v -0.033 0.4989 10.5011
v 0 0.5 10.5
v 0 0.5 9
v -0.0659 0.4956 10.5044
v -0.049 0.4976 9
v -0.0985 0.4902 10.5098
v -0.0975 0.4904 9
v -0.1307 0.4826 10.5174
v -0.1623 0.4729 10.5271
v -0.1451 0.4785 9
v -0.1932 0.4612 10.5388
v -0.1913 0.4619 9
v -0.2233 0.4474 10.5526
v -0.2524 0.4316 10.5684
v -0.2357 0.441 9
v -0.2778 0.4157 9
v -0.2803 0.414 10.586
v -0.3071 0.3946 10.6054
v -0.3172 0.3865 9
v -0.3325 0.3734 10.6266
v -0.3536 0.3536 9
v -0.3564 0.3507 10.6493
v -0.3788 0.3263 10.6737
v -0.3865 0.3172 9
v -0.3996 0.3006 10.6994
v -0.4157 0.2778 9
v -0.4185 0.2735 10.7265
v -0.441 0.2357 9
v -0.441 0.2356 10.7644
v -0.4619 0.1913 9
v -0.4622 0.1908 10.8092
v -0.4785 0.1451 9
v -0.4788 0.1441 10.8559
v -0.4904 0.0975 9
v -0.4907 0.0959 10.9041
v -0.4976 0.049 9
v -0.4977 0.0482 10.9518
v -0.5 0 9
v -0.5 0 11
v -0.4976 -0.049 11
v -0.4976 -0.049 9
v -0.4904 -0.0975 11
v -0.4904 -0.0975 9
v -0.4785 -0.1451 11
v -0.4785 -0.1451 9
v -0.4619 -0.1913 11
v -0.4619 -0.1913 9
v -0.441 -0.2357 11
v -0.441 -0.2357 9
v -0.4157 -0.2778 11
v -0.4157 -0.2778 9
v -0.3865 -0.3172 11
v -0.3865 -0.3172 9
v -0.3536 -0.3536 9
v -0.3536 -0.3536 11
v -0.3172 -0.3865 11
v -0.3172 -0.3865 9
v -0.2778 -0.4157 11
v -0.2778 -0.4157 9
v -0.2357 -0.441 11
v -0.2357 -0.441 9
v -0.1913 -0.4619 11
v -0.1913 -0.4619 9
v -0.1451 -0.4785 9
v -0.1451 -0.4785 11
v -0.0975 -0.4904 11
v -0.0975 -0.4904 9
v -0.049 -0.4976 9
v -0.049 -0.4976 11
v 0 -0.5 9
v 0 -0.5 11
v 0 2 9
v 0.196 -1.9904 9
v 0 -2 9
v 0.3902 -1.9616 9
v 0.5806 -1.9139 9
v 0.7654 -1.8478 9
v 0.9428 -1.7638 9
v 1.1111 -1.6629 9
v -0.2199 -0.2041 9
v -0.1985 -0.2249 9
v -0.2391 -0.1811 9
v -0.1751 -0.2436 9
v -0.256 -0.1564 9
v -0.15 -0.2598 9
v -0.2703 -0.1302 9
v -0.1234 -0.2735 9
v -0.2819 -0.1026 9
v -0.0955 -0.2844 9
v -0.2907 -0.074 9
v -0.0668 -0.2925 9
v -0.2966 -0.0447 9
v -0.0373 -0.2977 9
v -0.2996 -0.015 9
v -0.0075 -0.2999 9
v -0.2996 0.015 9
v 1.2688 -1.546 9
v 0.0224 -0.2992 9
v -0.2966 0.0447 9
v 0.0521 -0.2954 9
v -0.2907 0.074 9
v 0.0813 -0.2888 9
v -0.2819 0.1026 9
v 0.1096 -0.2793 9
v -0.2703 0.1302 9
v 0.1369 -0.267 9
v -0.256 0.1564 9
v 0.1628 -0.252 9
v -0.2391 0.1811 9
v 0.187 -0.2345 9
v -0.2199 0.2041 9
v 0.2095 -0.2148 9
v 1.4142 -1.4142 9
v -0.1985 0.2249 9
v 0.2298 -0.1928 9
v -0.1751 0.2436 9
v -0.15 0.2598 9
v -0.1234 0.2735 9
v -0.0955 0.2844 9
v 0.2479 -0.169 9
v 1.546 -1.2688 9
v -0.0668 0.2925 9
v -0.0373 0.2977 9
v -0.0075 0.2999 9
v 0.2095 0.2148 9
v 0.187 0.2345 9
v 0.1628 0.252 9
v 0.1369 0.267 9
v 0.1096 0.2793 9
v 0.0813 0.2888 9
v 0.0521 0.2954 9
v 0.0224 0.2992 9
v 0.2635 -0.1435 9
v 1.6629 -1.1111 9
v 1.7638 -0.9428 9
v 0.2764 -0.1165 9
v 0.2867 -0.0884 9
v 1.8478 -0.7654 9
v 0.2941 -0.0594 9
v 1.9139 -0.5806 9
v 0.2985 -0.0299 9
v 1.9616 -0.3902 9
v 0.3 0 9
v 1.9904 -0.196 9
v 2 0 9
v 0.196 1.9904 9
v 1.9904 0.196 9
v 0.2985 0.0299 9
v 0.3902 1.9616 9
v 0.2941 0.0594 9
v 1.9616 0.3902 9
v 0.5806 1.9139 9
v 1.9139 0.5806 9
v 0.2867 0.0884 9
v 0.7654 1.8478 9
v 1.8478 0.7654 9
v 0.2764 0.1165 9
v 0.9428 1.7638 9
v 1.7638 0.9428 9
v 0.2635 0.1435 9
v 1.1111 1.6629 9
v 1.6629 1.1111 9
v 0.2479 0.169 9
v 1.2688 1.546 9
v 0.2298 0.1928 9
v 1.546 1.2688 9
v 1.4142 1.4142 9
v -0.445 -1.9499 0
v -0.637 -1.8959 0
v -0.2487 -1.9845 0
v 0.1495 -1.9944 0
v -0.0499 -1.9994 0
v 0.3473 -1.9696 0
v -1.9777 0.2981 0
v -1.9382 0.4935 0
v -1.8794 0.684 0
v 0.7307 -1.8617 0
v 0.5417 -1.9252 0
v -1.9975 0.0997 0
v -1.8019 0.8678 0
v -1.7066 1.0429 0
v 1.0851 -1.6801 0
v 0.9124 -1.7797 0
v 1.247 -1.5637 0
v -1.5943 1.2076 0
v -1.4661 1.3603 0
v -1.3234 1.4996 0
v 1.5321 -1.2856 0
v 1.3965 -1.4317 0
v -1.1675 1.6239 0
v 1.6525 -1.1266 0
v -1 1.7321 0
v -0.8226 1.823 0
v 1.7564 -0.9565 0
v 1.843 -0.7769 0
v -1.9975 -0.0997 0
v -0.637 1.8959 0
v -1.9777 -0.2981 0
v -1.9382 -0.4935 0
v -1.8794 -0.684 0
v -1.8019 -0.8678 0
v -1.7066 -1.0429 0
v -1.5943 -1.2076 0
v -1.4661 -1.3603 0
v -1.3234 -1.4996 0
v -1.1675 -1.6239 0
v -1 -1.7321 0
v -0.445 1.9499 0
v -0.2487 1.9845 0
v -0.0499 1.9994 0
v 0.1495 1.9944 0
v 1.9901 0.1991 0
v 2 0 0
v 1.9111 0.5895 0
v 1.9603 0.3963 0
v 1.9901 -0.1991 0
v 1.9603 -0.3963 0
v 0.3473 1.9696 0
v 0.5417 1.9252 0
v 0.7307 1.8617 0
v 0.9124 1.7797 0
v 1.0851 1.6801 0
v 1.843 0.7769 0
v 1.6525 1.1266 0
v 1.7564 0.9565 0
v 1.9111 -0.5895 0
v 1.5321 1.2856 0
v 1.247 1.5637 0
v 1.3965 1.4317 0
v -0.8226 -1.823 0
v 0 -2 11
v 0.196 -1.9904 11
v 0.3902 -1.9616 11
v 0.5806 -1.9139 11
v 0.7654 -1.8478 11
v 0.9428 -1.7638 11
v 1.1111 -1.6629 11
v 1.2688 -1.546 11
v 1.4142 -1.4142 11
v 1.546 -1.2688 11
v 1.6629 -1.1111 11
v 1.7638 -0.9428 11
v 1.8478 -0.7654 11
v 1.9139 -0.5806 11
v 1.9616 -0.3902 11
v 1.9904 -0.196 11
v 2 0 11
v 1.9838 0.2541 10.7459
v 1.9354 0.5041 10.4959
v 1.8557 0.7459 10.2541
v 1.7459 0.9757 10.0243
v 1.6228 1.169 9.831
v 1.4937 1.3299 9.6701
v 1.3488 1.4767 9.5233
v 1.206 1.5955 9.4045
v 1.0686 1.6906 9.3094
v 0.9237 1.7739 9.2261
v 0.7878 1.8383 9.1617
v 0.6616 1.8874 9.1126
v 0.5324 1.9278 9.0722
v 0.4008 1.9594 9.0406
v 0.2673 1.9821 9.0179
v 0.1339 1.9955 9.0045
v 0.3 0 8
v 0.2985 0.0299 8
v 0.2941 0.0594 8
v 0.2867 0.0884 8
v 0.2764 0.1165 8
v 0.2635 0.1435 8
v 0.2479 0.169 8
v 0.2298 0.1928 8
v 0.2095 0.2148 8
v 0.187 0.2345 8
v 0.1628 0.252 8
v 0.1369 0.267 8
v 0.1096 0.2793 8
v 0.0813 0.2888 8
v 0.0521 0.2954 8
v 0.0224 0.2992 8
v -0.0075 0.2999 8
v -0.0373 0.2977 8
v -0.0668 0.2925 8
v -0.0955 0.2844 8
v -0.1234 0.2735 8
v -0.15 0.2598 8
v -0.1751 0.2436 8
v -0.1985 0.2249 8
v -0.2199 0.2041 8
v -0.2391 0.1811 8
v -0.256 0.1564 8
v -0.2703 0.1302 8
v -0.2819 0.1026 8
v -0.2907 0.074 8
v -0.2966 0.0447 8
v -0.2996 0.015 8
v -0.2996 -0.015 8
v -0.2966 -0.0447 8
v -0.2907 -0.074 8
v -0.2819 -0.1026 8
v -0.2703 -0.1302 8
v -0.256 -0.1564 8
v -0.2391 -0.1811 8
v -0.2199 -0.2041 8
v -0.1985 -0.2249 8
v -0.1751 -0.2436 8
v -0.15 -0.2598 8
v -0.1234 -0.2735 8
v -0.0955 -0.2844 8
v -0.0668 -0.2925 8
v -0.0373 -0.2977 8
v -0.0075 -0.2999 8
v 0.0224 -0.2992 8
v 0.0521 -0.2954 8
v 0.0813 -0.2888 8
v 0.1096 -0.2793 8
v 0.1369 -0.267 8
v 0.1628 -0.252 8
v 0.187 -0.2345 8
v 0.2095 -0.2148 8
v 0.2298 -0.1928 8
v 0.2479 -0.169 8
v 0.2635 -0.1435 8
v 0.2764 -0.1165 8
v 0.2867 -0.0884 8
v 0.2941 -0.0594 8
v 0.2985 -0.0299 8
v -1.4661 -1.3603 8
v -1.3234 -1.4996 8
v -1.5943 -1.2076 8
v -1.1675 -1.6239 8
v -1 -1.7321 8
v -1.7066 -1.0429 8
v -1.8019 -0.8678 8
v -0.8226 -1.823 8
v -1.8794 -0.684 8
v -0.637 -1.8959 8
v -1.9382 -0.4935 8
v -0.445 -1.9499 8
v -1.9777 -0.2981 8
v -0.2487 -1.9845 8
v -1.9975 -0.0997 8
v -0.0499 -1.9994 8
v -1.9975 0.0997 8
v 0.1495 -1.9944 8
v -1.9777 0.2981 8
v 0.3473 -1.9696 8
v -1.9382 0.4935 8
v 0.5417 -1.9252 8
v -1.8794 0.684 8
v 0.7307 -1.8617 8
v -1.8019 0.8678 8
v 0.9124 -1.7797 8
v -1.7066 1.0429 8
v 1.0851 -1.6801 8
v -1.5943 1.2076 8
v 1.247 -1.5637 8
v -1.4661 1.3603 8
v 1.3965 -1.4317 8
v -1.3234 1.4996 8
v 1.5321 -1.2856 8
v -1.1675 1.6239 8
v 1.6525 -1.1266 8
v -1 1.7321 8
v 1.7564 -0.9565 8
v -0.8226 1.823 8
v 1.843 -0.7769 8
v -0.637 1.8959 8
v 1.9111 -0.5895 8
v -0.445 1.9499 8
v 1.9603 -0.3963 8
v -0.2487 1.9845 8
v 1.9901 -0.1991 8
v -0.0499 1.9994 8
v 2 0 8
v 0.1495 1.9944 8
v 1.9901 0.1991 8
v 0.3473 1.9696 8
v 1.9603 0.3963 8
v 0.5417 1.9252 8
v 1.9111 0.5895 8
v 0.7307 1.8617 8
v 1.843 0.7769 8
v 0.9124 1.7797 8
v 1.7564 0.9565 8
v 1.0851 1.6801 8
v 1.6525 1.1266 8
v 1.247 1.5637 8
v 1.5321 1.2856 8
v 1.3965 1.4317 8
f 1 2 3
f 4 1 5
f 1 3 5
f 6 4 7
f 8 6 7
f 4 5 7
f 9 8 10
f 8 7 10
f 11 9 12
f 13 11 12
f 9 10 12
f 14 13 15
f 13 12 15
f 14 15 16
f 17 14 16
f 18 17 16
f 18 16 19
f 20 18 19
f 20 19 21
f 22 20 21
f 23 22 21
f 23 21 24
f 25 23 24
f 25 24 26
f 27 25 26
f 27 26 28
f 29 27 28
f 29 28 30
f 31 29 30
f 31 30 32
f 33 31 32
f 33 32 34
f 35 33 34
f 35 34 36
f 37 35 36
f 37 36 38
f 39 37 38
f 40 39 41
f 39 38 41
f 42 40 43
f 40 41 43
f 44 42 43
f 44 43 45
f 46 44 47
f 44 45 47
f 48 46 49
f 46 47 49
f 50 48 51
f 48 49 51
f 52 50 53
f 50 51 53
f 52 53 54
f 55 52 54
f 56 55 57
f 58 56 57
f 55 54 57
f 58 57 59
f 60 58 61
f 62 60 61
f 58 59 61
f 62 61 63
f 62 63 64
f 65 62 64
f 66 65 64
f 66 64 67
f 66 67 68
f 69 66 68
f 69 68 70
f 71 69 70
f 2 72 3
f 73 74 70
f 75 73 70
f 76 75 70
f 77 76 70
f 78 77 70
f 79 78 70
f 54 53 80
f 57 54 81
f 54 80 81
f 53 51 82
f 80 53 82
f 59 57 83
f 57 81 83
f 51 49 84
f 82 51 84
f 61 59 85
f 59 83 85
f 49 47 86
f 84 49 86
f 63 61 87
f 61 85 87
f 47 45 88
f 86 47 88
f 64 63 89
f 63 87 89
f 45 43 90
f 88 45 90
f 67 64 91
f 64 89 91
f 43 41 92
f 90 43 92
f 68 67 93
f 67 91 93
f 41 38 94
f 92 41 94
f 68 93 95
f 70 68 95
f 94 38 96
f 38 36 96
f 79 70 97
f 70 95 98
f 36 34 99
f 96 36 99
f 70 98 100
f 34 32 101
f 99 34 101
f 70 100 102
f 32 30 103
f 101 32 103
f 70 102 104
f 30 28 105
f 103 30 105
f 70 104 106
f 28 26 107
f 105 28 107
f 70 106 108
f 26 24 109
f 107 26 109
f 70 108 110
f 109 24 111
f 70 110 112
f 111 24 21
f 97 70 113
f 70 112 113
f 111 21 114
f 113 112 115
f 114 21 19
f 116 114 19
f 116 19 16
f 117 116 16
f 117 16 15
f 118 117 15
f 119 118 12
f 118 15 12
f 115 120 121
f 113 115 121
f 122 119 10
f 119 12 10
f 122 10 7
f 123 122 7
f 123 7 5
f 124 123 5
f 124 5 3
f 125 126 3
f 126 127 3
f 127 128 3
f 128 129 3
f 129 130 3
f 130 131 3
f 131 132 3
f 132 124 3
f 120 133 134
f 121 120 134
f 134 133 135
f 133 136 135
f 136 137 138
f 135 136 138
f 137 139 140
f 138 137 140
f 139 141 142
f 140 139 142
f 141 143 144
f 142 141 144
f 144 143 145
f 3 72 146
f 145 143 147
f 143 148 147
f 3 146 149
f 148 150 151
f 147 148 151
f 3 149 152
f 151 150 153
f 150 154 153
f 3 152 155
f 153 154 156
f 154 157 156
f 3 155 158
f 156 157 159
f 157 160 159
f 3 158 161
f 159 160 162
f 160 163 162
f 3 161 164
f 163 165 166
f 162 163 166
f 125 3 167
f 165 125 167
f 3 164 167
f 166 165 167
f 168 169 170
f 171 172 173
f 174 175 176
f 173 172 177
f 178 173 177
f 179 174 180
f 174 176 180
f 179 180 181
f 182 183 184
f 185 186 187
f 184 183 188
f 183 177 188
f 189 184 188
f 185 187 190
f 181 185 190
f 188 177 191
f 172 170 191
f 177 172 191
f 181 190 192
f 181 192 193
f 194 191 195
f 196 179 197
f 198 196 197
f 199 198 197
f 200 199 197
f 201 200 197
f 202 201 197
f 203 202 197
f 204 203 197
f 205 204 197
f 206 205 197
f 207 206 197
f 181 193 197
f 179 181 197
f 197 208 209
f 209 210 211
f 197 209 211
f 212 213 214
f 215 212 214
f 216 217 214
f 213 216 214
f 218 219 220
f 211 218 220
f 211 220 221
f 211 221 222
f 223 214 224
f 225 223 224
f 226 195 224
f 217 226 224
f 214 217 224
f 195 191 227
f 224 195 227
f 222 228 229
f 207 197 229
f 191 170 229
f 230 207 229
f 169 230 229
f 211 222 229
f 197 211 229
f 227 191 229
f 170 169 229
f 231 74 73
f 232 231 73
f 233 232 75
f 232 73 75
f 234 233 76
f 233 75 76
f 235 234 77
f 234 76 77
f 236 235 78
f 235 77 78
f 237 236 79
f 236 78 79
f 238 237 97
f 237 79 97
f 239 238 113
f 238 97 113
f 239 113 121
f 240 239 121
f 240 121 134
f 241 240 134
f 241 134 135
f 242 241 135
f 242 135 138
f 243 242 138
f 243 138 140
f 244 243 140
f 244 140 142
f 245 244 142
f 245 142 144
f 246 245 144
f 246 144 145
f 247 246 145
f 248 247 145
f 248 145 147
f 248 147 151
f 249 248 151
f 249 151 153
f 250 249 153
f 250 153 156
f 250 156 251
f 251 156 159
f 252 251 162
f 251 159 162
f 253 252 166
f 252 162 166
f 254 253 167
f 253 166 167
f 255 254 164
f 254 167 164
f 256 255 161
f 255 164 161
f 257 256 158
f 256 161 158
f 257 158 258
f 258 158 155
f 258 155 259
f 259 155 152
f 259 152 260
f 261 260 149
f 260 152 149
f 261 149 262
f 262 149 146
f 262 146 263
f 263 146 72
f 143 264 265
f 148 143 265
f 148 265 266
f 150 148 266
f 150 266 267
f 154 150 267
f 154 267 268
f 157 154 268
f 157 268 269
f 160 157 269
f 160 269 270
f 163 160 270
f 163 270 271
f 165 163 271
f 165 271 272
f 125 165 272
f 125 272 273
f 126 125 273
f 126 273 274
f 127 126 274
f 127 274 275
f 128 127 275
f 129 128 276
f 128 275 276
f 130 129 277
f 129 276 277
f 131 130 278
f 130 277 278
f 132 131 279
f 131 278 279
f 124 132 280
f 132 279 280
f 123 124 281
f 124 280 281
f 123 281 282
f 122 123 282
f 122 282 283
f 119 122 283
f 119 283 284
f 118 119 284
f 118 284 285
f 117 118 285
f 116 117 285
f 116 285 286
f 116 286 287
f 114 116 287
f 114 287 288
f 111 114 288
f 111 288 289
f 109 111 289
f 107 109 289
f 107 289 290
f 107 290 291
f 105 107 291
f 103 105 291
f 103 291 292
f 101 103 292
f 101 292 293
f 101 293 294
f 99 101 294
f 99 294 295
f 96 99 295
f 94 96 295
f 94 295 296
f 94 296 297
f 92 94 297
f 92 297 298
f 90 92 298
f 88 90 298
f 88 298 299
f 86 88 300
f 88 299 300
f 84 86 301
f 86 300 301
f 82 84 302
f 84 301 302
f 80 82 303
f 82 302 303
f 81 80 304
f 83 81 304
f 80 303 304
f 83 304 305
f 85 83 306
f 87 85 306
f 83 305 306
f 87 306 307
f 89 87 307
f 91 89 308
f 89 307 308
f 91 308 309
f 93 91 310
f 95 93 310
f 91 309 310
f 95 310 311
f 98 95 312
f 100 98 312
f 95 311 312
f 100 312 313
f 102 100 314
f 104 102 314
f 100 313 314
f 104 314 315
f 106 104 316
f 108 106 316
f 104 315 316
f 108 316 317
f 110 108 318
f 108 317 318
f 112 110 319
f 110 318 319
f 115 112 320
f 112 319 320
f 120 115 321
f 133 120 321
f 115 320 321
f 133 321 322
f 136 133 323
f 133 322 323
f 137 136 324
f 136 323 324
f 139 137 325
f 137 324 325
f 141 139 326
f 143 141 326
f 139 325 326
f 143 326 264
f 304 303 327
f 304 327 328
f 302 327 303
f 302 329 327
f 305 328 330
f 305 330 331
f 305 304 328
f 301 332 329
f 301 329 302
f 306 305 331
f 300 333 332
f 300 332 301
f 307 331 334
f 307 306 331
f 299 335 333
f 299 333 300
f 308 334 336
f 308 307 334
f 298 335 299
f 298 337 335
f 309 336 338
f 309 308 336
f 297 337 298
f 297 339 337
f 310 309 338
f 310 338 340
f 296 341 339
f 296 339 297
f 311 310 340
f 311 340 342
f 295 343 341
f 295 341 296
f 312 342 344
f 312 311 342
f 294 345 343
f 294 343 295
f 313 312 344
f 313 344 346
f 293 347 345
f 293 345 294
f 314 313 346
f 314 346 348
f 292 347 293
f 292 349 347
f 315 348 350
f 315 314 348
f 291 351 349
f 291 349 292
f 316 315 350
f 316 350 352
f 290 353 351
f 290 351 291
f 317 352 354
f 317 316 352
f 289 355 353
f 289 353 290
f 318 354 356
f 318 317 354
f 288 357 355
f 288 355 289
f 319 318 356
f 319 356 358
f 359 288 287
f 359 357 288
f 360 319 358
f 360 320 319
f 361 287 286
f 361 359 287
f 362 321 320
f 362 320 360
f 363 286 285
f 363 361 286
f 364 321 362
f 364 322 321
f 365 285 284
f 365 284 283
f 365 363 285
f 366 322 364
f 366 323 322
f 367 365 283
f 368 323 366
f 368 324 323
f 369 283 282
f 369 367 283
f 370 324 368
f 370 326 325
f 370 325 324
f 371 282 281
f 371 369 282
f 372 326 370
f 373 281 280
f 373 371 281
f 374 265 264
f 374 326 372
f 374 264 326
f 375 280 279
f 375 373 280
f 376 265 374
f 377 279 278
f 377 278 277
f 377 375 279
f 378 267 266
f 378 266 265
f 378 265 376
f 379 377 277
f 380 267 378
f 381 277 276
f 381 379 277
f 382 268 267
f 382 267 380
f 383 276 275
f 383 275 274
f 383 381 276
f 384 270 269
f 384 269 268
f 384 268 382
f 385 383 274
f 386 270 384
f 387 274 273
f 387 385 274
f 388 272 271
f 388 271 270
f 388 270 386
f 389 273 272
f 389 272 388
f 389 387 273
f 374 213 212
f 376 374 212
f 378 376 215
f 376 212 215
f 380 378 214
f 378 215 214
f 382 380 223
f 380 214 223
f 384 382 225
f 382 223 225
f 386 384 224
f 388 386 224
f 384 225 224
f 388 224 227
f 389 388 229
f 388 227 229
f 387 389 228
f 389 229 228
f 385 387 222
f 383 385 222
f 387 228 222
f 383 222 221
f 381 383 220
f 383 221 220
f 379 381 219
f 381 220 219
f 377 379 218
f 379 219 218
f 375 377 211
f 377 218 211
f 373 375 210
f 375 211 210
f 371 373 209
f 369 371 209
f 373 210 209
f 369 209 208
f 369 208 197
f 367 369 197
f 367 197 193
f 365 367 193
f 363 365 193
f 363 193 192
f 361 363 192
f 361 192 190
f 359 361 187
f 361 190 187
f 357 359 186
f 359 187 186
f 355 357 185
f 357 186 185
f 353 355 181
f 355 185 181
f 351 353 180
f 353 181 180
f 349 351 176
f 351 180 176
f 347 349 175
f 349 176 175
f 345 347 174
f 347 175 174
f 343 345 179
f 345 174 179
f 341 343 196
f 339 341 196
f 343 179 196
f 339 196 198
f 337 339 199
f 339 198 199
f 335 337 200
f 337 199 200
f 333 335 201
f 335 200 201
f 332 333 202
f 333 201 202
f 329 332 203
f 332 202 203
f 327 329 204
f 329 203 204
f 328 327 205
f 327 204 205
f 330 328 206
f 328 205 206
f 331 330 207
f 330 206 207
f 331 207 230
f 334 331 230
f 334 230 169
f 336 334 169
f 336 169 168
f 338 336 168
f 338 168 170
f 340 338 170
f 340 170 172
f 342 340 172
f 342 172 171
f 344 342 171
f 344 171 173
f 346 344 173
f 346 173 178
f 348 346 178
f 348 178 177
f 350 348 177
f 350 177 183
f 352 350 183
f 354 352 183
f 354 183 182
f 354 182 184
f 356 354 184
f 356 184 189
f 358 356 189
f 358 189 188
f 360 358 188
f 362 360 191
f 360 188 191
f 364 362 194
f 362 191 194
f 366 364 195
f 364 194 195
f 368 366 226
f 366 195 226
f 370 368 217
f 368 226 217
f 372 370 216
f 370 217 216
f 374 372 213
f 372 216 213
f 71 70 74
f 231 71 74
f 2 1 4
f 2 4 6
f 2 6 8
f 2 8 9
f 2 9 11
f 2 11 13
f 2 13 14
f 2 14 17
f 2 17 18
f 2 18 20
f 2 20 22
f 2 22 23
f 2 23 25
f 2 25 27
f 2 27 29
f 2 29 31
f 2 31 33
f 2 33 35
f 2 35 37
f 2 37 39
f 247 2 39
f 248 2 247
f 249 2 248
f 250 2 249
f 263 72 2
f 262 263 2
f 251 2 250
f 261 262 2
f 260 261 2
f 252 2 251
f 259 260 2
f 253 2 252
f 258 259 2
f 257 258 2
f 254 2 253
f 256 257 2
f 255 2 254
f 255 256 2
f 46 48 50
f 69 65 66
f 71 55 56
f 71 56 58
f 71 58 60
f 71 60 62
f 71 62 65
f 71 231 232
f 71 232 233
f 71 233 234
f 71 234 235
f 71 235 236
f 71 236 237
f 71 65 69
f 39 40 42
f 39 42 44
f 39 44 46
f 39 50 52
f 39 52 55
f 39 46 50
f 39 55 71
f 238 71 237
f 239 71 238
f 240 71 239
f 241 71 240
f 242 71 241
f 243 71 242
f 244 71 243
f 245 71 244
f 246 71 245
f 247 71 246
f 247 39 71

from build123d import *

# Parameters (mm, degrees)
BOX_W             = 4
BOX_H             = 3
BOX_DEPTH         = 2
BOX_ROLL_ANGLE    = -45
CYLINDER001_R     = 0.3
CYLINDER001_DEPTH = 11
CYLINDER_R        = 2
CYLINDER_DEPTH    = 8
CYLINDER002_R     = 0.5
CYLINDER002_DEPTH = 2
PAD_DEPTH         = 2


with BuildPart() as w_rfel:
    # Box → Box (new body)
    with BuildSketch(Plane.XY):
        with Locations((2, 1.5)):
            Rectangle(BOX_W, BOX_H)
    extrude(amount=BOX_DEPTH)


with BuildPart() as w_rfel_1:
    # Box roll: moved
    add(w_rfel.part.rotate(Axis((0, 0, 0), (1, 0, 0)), BOX_ROLL_ANGLE))


with BuildPart() as w_rfel_2:
    # Box placement: moved
    add(w_rfel_1.part.moved(Location((-1, 0, 11))))


with BuildPart() as achse:
    # Cylinder001 → Cylinder001 (new body)
    with BuildSketch(Plane.XY):
        Circle(CYLINDER001_R)
    extrude(amount=CYLINDER001_DEPTH)


with BuildPart() as motor:
    # Cylinder → Cylinder (new body)
    with BuildSketch(Plane.XY):
        Circle(CYLINDER_R)
    extrude(amount=CYLINDER_DEPTH)


with BuildPart() as zylinder:
    # Cylinder002 → Cylinder002 (new body)
    with BuildSketch(Plane.XY.offset(9)):
        Circle(CYLINDER002_R)
    extrude(amount=CYLINDER002_DEPTH)


with BuildPart() as cut:
    # Sketch → Pad (new body)
    with BuildSketch(Plane.XY.offset(9)):
        with BuildLine():
            Line((0, 2), (0, -2))
            ThreePointArc((0, -2), (2, 0), (0, 2))
        make_face()
    extrude(amount=PAD_DEPTH)

    # Fusion: union Achse, Motor, Zylinder
    add(achse.part)
    add(motor.part)
    add(zylinder.part)

    # Cut: cut Würfel
    add(w_rfel_2.part, mode=Mode.SUBTRACT)


solid = cut.part
